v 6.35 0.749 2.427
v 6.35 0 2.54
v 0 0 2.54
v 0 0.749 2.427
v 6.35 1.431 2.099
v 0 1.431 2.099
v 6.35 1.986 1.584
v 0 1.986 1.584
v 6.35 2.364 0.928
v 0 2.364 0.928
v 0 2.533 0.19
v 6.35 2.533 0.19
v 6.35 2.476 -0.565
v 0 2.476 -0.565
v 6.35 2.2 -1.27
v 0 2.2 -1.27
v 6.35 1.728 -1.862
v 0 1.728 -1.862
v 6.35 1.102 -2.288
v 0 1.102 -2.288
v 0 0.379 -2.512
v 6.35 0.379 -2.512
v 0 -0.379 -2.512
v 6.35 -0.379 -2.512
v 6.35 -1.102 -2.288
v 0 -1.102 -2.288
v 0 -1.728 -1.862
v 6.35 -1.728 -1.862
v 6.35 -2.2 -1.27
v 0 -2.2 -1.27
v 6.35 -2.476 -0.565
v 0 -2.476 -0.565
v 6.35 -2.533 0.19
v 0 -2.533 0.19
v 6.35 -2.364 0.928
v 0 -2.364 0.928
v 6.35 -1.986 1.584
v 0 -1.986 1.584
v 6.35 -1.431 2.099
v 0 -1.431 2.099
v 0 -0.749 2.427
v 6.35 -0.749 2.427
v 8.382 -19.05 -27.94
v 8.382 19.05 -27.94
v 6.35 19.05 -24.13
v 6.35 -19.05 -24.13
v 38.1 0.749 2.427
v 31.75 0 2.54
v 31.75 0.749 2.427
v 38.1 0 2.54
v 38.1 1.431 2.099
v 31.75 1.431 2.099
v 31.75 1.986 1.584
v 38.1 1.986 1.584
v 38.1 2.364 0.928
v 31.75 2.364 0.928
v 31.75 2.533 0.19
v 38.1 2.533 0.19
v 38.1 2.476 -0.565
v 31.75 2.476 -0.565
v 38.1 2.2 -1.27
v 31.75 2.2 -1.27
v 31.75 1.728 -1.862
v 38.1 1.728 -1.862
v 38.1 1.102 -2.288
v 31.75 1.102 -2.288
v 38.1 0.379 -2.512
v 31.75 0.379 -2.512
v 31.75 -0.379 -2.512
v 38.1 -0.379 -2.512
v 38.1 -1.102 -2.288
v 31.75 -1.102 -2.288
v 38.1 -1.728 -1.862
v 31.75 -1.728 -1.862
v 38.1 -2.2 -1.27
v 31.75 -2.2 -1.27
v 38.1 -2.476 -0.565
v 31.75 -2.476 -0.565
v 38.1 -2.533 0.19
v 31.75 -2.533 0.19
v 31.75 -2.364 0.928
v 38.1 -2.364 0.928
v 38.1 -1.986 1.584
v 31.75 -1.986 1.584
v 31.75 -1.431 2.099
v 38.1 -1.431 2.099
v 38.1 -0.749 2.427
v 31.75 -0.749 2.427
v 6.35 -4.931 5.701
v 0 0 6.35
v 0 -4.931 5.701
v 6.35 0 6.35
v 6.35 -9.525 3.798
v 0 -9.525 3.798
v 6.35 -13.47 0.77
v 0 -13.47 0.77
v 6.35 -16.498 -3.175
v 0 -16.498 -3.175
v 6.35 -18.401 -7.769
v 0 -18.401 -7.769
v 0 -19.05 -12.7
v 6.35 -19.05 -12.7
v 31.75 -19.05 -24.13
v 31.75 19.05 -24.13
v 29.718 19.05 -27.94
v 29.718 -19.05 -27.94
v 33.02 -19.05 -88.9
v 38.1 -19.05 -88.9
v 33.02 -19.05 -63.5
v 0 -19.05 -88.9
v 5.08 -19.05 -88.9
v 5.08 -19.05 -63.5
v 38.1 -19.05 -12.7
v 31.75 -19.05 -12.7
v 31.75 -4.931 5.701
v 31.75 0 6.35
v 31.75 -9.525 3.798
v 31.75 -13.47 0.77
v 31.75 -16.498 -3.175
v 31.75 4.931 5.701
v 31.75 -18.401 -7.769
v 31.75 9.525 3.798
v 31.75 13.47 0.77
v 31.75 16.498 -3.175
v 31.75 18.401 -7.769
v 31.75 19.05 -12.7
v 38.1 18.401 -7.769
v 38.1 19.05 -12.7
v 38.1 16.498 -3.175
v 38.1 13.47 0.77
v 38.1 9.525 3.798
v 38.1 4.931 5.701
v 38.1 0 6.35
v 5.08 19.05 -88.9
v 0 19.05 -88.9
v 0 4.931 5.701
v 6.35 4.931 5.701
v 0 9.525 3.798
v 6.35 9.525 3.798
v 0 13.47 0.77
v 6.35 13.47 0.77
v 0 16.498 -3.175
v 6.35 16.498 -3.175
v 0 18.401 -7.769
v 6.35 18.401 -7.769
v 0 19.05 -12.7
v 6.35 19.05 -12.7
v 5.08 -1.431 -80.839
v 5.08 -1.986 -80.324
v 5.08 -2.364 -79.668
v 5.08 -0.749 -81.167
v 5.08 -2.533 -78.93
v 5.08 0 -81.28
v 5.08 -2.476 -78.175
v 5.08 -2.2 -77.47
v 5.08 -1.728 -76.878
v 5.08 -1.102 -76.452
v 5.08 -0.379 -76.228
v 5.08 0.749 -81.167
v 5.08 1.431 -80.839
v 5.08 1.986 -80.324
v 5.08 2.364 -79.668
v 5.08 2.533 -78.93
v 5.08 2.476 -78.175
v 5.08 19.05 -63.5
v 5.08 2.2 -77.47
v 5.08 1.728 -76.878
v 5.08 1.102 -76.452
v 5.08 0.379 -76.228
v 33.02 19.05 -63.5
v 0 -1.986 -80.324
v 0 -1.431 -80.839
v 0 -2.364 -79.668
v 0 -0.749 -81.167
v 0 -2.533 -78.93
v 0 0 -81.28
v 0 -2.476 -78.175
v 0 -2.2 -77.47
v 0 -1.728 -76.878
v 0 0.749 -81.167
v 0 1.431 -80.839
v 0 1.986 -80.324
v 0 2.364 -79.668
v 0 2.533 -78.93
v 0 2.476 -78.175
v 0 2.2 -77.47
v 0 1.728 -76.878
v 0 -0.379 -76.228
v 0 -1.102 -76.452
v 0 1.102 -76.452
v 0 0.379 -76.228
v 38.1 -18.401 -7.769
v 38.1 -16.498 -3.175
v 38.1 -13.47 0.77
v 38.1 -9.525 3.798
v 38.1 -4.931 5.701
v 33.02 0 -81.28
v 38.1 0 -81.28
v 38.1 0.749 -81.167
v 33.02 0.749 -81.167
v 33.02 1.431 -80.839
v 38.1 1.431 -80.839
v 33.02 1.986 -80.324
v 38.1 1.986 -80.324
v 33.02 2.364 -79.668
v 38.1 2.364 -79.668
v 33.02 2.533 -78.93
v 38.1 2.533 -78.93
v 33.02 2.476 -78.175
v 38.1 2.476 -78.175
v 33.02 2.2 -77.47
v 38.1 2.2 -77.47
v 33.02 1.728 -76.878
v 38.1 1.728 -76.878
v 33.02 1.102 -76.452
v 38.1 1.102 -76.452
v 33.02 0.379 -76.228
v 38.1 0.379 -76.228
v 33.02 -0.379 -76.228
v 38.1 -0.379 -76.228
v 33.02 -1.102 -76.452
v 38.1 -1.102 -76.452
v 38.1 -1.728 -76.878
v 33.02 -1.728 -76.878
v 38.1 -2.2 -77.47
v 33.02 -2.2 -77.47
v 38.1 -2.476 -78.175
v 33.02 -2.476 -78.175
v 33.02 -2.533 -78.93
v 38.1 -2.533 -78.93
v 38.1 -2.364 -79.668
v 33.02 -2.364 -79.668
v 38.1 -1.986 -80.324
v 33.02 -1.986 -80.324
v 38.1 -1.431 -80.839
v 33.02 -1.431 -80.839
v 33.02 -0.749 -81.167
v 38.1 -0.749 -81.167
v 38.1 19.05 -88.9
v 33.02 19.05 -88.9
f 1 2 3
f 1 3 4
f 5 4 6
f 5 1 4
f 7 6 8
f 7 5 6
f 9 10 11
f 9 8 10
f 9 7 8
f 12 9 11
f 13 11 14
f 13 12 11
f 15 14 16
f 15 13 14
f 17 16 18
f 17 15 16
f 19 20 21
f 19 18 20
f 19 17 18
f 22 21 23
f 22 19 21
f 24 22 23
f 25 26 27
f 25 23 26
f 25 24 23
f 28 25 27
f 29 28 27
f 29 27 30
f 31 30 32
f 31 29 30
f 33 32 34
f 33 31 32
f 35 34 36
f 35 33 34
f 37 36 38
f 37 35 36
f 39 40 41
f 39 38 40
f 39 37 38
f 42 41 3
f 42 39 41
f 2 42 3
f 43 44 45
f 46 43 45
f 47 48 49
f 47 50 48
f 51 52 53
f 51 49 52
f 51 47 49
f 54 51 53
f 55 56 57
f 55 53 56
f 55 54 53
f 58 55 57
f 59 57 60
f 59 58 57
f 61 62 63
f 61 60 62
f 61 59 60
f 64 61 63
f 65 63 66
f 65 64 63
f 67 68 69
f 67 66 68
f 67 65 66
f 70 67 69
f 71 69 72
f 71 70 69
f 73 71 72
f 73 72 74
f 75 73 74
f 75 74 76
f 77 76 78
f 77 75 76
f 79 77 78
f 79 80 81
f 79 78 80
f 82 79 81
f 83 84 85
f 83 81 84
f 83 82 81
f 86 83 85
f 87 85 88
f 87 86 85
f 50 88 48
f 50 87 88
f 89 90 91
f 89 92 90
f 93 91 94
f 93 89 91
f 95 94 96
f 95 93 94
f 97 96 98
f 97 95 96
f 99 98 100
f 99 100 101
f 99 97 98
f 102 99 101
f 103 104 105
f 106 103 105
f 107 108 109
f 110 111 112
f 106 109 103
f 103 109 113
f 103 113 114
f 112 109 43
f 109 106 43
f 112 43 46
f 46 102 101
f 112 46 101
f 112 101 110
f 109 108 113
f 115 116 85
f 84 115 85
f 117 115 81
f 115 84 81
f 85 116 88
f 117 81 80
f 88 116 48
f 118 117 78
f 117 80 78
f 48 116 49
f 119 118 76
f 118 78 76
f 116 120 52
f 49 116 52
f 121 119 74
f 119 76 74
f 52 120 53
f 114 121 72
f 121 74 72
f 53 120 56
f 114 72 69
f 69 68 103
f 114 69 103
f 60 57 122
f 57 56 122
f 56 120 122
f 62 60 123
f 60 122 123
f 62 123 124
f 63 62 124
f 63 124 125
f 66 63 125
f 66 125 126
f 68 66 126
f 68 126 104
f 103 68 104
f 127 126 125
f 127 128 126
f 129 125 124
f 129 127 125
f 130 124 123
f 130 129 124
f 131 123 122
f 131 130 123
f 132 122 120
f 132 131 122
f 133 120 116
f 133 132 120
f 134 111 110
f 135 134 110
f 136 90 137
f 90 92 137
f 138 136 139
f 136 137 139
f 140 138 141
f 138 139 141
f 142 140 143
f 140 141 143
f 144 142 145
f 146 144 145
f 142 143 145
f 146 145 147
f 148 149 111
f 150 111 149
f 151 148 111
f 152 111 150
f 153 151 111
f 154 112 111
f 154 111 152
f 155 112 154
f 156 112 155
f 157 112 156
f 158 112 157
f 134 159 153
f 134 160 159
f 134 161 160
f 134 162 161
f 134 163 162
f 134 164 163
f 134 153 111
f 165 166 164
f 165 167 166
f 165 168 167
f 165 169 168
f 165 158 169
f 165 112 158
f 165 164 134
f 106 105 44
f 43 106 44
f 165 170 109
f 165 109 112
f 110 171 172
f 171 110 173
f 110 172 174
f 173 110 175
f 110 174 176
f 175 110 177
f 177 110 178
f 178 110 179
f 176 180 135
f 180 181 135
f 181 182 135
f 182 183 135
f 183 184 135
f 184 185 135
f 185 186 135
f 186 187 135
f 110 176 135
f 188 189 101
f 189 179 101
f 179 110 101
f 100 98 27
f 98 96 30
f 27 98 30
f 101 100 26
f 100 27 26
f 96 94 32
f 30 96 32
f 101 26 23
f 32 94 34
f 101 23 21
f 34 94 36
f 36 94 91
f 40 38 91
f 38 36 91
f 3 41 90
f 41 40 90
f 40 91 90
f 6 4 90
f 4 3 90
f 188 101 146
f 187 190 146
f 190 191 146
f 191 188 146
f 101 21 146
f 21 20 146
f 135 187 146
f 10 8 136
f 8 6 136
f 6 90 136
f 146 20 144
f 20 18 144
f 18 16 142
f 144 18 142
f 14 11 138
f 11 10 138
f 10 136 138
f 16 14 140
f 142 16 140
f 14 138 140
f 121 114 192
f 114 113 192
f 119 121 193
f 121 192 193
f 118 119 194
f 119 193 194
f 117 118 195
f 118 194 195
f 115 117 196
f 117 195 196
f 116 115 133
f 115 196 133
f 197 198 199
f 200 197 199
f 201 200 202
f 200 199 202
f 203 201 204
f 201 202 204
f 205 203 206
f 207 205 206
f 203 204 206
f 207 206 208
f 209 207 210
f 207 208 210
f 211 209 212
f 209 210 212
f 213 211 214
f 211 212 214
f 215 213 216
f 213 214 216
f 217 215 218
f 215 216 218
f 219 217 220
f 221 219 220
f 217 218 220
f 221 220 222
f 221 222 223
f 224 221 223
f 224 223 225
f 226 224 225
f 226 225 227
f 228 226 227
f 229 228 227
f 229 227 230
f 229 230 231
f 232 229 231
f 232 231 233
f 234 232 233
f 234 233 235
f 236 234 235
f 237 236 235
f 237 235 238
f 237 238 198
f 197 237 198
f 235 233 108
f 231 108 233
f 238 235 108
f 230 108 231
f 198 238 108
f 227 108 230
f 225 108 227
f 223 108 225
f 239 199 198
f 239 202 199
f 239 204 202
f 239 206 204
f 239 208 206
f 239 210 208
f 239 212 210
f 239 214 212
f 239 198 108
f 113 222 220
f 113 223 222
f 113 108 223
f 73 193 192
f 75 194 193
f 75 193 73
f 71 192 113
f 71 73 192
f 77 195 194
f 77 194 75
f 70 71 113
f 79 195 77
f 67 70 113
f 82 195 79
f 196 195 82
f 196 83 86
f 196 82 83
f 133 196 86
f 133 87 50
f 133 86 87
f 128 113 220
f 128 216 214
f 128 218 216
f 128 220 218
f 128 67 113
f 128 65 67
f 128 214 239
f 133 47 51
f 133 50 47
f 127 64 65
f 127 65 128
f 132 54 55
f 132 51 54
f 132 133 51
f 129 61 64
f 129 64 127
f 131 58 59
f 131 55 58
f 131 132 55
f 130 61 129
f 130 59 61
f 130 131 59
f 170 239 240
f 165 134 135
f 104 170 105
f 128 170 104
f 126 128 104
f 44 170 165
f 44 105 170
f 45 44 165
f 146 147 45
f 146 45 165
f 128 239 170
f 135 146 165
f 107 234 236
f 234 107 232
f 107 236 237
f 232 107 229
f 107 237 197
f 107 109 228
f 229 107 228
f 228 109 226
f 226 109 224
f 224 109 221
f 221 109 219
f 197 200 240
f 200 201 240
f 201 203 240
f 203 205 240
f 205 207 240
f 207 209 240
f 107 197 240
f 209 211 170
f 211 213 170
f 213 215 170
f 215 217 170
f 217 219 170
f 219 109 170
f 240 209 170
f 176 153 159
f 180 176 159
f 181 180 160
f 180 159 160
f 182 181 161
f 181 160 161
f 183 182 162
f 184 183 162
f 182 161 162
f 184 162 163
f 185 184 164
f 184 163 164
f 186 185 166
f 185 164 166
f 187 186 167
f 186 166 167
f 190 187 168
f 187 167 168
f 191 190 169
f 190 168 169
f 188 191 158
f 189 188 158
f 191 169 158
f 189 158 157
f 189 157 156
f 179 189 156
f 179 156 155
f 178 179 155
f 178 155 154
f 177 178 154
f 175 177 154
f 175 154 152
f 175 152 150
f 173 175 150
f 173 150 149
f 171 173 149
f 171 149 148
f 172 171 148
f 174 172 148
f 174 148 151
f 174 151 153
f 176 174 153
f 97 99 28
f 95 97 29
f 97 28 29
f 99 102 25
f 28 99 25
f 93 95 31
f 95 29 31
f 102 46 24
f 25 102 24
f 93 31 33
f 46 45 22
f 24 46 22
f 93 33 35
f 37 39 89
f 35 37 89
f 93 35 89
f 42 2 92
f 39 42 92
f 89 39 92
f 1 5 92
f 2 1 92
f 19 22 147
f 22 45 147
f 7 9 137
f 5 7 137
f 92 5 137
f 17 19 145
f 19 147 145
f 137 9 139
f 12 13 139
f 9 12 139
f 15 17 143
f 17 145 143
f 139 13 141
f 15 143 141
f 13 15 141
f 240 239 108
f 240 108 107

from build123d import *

# Parameters (mm, degrees)
SKETCH1_W                  = 38.1
SKETCH1_H                  = 38.1
PRONG_HOLDERS_DEPTH        = 19.05
SKETCH5_R                  = 2.54
SCREW_HOLDER_DEPTH         = 58.15
GROOVE_CUT_OUT_DEPTH       = 58.15
SKETCH6_W                  = 38.1
SKETCH6_H                  = 31.75
OPENING_OF_THE_TOP_DEPTH   = 66.991135768
ROUNDING_OFF_HODER_EDGES_R = 19.05
SKETCH7_W                  = 38.1
SKETCH7_H                  = 38.1
ADJUSTABLE_LENGTH_DEPTH    = 25.4
SKETCH8_W                  = 5.08
SKETCH8_H                  = 38.1
BOSS_EXTRUDE3_DEPTH        = 25.4
SKETCH9_R                  = 2.54
CUT_EXTRUDE4_DEPTH         = 99.578509321


with BuildPart() as part:
    # Sketch1 → Prong holders (new, symmetric)
    with BuildSketch(Plane(origin=(0, 0, 0), x_dir=(1, 0, 0), z_dir=(0, 1, 0))):
        with Locations((19.05, 19.05)):
            Rectangle(SKETCH1_W, SKETCH1_H)
    prong_holders = extrude(amount=PRONG_HOLDERS_DEPTH, both=True)

    # Sketch5 → Screw holder (cut, through all)
    with BuildSketch(Plane(origin=(38.1, 0, 0), x_dir=(0, 0, -1), z_dir=(1, 0, 0))):
        Circle(SKETCH5_R)
    screw_holder = extrude(amount=-SCREW_HOLDER_DEPTH, mode=Mode.SUBTRACT)

    # Sketch4 → Groove cut out (cut, symmetric)
    with BuildSketch(Plane(origin=(0, 0, 0), x_dir=(1, 0, 0), z_dir=(0, 1, 0))):
        Polygon((31.75, 24.13), (29.718, 27.94), (8.382, 27.94), (6.35, 24.13), (6.35, 0), (31.75, 0), align=None)
    groove_cut_out = extrude(amount=GROOVE_CUT_OUT_DEPTH, both=True, mode=Mode.SUBTRACT)

    # Mirror2: Prong holders, Screw holder, Groove cut out across plane
    add(prong_holders.mirror(Plane(origin=(0, 19.05, 0), x_dir=(1, 0, 0), z_dir=(0, 0, -1))))
    add(screw_holder.mirror(Plane(origin=(0, 19.05, 0), x_dir=(1, 0, 0), z_dir=(0, 0, -1))), mode=Mode.SUBTRACT)
    add(groove_cut_out.mirror(Plane(origin=(0, 19.05, 0), x_dir=(1, 0, 0), z_dir=(0, 0, -1))), mode=Mode.SUBTRACT)

    # Sketch6 → Opening of the top (cut, through all)
    with BuildSketch(Plane.XZ.offset(19.05)):
        with Locations((19.05, 22.225)):
            Rectangle(SKETCH6_W, SKETCH6_H)
    extrude(amount=-OPENING_OF_THE_TOP_DEPTH, mode=Mode.SUBTRACT)

    # Rounding off hoder edges
    rounding_off_hoder_edges_edges = [part.edges().sort_by_distance(p)[0] for p in [
        (3.175, 19.05, 6.35),
        (3.175, -19.05, 6.35),
        (34.925, -19.05, 6.35),
        (34.925, 19.05, 6.35),
    ]]
    fillet(rounding_off_hoder_edges_edges, radius=ROUNDING_OFF_HODER_EDGES_R - 0.0001)  # a hair under: the kernel refuses the full size

    # Sketch7 → Adjustable length (add)
    with BuildSketch(Plane(origin=(0, 0, -38.1), x_dir=(-1, 0, 0), z_dir=(0, 0, -1))):
        with Locations((-19.05, 0)):
            Rectangle(SKETCH7_W, SKETCH7_H)
    extrude(amount=ADJUSTABLE_LENGTH_DEPTH)

    # Sketch8 → Boss-Extrude3 (add)
    with BuildSketch(Plane(origin=(0, 0, -63.5), x_dir=(-1, 0, 0), z_dir=(0, 0, -1))):
        with Locations((-35.56, 0)):
            Rectangle(SKETCH8_W, SKETCH8_H)
        with Locations((-2.54, 0)):
            Rectangle(SKETCH8_W, SKETCH8_H)
    extrude(amount=BOSS_EXTRUDE3_DEPTH)

    # Sketch9 → Cut-Extrude4 (cut, through all)
    with BuildSketch(Plane(origin=(38.1, 0, 0), x_dir=(0, 0, -1), z_dir=(1, 0, 0))):
        with Locations((78.74, 0)):
            Circle(SKETCH9_R)
    extrude(amount=-CUT_EXTRUDE4_DEPTH, mode=Mode.SUBTRACT)


solid = part.part
